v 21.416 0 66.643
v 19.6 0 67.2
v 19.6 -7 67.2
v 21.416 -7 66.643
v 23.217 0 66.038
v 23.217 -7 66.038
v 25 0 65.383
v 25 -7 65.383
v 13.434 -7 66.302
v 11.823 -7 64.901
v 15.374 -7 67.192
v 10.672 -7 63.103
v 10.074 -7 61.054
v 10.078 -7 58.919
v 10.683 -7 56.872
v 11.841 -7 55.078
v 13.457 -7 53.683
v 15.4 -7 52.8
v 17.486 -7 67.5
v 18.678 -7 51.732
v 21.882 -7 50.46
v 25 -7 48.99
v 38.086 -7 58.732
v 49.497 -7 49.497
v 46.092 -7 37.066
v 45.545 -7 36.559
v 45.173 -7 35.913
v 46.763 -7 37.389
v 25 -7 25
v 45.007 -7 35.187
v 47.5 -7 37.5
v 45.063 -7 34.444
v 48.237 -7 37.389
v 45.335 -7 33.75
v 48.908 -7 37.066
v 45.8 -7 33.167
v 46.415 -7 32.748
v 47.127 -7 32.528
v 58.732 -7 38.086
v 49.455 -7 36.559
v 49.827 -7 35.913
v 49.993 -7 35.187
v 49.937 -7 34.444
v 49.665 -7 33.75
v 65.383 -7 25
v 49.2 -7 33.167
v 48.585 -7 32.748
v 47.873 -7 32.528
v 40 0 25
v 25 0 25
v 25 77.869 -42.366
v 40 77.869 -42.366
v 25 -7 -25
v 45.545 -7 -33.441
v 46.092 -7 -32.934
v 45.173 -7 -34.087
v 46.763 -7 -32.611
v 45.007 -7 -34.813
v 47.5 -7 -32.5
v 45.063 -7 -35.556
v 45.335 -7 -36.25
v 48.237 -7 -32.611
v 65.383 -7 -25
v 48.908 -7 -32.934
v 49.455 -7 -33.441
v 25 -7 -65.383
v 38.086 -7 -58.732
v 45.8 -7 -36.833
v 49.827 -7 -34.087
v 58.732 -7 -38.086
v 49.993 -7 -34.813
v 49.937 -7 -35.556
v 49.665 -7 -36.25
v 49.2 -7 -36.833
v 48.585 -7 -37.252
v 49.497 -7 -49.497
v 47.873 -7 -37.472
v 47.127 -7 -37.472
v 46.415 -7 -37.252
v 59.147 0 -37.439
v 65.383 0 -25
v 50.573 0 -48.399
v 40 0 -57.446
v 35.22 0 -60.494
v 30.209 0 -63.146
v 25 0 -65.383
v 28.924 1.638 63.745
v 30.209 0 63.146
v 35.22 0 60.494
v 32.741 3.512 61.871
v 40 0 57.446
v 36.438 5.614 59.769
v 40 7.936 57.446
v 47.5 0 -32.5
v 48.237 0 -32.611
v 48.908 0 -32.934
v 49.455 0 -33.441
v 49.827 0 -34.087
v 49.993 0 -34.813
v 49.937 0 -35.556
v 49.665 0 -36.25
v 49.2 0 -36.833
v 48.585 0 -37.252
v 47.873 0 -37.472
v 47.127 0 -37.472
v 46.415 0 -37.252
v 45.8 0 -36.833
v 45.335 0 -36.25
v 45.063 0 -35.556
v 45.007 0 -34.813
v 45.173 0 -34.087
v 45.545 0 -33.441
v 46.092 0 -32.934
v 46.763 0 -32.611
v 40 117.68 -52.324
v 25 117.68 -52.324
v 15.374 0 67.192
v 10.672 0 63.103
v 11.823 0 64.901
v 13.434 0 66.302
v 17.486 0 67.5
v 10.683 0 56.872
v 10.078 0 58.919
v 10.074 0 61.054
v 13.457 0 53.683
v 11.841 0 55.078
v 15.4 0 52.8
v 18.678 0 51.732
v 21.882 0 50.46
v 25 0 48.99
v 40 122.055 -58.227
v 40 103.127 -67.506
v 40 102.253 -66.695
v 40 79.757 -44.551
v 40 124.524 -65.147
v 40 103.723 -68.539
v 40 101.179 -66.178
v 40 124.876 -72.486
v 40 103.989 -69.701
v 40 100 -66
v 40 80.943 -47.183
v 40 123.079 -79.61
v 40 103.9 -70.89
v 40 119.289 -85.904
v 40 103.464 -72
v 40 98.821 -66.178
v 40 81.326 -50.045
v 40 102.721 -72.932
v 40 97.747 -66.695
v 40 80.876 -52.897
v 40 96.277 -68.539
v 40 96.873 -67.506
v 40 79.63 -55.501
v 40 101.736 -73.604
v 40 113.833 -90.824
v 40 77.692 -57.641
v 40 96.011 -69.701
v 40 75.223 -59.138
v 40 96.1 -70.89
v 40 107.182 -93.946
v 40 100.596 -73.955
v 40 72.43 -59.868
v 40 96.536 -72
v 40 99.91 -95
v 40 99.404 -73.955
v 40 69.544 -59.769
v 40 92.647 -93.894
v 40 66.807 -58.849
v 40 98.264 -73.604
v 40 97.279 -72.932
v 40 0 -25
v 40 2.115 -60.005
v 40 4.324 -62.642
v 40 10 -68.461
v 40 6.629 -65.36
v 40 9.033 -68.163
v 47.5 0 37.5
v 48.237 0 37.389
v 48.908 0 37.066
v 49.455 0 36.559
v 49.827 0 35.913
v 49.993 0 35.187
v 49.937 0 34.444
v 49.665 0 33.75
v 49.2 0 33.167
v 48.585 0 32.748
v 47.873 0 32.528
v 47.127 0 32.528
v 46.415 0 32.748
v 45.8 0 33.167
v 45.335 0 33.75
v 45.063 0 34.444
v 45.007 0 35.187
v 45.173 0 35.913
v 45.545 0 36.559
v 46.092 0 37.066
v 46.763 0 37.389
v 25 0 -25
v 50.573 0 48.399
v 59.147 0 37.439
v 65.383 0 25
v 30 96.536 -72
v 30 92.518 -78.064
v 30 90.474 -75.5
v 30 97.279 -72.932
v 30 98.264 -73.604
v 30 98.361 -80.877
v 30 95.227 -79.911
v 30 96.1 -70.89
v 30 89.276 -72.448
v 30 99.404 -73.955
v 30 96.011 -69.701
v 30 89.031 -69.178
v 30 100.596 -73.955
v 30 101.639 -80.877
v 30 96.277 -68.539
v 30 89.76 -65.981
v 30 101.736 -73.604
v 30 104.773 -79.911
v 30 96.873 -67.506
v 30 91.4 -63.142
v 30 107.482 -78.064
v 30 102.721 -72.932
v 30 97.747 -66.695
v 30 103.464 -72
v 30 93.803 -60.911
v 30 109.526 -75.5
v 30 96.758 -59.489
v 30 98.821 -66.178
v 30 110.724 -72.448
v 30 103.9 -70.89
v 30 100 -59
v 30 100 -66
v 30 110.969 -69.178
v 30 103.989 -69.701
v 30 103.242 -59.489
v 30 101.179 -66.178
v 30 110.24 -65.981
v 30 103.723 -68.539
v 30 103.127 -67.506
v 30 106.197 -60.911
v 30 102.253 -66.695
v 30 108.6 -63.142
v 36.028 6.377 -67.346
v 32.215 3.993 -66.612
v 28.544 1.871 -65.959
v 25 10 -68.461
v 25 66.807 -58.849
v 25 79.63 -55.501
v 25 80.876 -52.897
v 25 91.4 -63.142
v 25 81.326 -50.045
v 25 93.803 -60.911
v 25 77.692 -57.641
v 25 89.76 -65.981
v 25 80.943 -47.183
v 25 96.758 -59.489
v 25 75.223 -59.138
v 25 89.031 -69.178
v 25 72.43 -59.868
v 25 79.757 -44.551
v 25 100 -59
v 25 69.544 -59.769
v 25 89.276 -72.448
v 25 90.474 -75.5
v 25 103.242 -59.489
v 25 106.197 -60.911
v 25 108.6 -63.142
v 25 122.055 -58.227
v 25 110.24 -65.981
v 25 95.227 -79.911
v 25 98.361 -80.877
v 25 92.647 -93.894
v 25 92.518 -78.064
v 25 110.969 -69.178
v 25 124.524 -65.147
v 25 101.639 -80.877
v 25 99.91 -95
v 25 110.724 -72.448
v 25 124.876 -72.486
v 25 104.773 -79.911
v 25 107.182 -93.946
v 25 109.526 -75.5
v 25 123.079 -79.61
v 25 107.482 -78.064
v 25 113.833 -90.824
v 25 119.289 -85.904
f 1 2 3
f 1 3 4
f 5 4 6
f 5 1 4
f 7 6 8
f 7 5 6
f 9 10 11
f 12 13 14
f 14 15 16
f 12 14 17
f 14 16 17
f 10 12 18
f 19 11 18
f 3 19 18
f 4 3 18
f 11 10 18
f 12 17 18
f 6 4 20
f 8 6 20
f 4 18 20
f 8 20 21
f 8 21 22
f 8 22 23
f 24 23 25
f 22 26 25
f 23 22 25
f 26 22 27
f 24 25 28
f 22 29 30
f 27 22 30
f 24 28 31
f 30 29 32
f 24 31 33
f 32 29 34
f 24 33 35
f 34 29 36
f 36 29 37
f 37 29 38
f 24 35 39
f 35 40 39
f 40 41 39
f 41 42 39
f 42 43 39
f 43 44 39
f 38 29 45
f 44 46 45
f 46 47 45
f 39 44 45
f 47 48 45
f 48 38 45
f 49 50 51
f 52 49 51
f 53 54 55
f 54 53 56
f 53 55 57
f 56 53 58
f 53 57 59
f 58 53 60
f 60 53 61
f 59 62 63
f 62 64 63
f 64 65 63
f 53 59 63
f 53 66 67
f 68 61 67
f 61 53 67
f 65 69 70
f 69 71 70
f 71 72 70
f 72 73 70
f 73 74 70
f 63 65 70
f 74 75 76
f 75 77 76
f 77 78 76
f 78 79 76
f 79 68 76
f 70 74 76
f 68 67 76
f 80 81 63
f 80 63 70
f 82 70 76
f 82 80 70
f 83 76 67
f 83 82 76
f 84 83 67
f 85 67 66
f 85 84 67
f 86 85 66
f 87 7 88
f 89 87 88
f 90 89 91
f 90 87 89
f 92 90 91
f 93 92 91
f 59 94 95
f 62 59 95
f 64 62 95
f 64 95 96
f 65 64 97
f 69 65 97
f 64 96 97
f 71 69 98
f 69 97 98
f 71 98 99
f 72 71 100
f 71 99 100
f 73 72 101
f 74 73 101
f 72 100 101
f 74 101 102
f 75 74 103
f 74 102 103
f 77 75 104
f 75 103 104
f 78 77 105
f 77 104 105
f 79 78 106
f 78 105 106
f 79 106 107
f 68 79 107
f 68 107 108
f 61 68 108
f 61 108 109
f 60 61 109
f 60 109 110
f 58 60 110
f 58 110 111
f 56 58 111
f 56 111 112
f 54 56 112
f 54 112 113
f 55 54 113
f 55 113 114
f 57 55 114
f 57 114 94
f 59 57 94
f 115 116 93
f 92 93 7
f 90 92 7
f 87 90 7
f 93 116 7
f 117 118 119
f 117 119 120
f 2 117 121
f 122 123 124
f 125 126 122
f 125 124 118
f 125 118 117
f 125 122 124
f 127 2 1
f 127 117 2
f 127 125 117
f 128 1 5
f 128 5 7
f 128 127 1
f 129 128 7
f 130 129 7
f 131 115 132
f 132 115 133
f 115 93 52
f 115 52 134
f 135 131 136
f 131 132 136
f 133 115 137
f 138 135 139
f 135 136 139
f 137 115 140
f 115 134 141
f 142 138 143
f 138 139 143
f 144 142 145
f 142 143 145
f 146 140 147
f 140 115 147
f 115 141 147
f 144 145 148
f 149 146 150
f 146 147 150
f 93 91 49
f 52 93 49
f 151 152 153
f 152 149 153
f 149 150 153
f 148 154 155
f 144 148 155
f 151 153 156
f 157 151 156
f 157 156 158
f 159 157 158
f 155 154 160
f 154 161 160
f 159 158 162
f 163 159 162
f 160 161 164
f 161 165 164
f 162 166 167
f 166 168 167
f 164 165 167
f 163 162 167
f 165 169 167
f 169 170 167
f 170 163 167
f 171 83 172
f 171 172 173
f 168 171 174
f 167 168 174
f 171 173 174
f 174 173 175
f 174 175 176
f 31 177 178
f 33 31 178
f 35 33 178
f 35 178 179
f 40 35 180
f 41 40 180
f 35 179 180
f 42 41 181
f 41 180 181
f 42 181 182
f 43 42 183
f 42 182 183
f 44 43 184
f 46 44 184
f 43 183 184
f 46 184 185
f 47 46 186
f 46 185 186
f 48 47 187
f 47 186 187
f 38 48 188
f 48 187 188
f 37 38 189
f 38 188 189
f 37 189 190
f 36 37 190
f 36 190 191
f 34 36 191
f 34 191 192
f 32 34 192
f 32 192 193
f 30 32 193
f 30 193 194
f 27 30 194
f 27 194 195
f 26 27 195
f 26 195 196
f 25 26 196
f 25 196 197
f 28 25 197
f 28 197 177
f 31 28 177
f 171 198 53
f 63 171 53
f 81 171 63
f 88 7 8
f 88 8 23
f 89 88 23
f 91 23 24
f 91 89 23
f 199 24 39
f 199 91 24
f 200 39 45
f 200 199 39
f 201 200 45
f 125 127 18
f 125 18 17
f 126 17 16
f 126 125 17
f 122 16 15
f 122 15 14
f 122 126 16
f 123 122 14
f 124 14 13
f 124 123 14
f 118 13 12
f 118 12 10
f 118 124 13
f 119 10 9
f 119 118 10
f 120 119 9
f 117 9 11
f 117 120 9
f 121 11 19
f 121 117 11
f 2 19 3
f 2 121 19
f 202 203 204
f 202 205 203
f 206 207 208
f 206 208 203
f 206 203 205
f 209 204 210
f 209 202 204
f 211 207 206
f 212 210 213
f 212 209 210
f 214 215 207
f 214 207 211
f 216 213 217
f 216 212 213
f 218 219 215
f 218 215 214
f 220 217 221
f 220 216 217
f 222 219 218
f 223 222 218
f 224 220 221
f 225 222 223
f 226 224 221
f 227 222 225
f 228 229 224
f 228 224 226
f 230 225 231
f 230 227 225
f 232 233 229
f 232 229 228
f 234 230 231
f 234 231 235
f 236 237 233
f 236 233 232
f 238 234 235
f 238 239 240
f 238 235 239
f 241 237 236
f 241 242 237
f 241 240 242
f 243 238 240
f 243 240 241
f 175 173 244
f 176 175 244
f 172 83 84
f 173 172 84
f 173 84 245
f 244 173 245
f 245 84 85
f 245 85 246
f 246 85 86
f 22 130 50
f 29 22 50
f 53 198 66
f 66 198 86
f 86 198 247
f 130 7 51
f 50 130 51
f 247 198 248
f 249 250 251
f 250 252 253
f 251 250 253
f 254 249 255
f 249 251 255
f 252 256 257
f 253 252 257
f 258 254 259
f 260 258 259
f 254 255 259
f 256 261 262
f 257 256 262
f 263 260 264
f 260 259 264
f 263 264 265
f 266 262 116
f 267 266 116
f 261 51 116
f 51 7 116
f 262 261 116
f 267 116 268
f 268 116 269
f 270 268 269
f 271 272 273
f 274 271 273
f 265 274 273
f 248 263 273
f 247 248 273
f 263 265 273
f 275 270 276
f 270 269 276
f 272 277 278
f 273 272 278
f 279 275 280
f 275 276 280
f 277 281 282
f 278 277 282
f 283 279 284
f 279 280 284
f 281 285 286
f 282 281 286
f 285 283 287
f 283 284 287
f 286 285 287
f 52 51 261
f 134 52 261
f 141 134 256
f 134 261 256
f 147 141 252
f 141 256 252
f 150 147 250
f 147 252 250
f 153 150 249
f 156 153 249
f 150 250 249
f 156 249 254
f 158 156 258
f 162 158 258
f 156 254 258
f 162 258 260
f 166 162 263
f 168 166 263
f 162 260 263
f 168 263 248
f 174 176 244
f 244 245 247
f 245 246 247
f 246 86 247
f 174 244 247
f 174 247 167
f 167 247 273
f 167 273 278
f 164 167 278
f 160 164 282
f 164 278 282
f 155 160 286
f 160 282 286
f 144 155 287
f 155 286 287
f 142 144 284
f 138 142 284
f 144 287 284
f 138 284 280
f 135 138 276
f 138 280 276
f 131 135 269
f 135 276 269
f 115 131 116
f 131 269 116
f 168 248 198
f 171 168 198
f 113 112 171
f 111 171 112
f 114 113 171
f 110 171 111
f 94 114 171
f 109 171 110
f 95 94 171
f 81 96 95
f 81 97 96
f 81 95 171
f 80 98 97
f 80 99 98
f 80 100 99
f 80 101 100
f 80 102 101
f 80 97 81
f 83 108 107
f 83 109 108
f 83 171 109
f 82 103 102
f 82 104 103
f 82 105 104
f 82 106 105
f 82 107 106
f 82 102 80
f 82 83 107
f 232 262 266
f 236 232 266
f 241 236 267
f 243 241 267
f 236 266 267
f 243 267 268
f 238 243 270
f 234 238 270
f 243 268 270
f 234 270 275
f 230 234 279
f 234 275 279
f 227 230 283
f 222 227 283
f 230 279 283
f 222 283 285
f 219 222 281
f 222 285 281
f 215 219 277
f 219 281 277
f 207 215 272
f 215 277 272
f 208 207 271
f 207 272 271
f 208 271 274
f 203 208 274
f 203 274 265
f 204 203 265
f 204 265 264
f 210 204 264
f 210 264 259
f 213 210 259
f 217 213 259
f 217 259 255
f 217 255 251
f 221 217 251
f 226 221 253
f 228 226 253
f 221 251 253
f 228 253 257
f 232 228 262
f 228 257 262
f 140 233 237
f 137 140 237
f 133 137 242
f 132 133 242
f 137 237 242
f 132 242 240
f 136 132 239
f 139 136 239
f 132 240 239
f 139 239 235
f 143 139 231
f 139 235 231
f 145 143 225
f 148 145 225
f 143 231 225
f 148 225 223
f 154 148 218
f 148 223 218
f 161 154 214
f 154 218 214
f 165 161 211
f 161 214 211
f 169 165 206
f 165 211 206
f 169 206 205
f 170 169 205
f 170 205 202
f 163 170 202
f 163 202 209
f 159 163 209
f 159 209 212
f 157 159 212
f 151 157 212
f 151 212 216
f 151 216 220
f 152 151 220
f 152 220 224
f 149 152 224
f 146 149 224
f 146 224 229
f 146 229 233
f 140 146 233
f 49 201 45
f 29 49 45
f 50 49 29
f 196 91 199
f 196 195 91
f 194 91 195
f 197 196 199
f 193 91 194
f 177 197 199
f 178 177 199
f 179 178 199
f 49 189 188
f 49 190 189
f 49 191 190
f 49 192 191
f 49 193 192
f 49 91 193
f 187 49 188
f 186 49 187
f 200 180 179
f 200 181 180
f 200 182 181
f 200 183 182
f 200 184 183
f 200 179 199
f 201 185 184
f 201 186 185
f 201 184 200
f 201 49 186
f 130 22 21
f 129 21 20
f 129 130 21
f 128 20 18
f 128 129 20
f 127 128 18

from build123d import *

# Parameters (mm, degrees)
BOSS_EXTRUDE1_DEPTH   = 7
BOSS_EXTRUDE1_2_DEPTH = 7
BOSS_EXTRUDE2_DEPTH   = 15
CUT_EXTRUDE2_START    = 10
SKETCH3_R             = 92.486171345
SKETCH3_R_2           = 70
CUT_EXTRUDE2_DEPTH    = 10
CHAMFER2_SIZE         = 10
SKETCH4_R             = 4
CUT_EXTRUDE3_DEPTH    = 163.113620009
SKETCH5_R             = 11
CUT_EXTRUDE4_DEPTH    = 5
SKETCH6_R             = 2.5
CUT_EXTRUDE5_DEPTH    = 171.073513517
BOSS_EXTRUDE3_DEPTH   = 7


with BuildPart() as part:
    # Sketch1 → Boss-Extrude1 (new body)
    with BuildSketch(Plane(origin=(0, 0, 0), x_dir=(1, 0, 0), z_dir=(0, 1, 0))):
        with BuildLine():
            ThreePointArc((65.383484153, 25), (49.497474683, 49.497474683), (25, 65.383484153))
            Line((25, 65.383484153), (25, 25))
            Line((25, 25), (65.383484153, 25))
        make_face()
    extrude(amount=-BOSS_EXTRUDE1_DEPTH)



with BuildPart() as body_2:
    # Sketch1 → Boss-Extrude1 2 (new body)
    with BuildSketch(Plane(origin=(0, 0, 0), x_dir=(1, 0, 0), z_dir=(0, 1, 0))):
        with BuildLine():
            Line((25, -25), (25, -65.383484153))
            ThreePointArc((25, -65.383484153), (49.497474683, -49.497474683), (65.383484153, -25))
            Line((65.383484153, -25), (25, -25))
        make_face()
    extrude(amount=-BOSS_EXTRUDE1_2_DEPTH)


with BuildPart() as part_1:
    add(part.part)

    add(body_2.part)  # Boss-Extrude2 merges body 2
    # Sketch2 → Boss-Extrude2 (add)
    with BuildSketch(Plane.ZY.offset(-25)):
        with BuildLine():
            Line((-65.383484153, 0), (-93.894188194, 92.646921016))
            ThreePointArc((-93.894188194, 92.646921016), (-82.896855971, 121.416608183), (-52.324444318, 117.679783125))
            Line((-52.324444318, 117.679783125), (65.383484153, 0))
            Line((65.383484153, 0), (25, 0))
            Line((25, 0), (-42.366125313, 77.869487777))
            ThreePointArc((-42.366125313, 77.869487777), (-55.501453858, 79.630239272), (-58.849166194, 66.807216074))
            Line((-58.849166194, 66.807216074), (-25, 0))
            Line((-25, 0), (-65.383484153, 0))
        make_face()
    extrude(amount=-BOSS_EXTRUDE2_DEPTH)

    # Sketch3 → Cut-Extrude2 (cut)
    with BuildSketch(Plane(origin=(0, 0, 0), x_dir=(1, 0, 0), z_dir=(0, 1, 0)).offset(CUT_EXTRUDE2_START)):
        Circle(SKETCH3_R)
        Circle(SKETCH3_R_2, mode=Mode.SUBTRACT)
    extrude(amount=-CUT_EXTRUDE2_DEPTH, mode=Mode.SUBTRACT)

    # Chamfer2
    # the kernel refuses this chamfer: 10 mm, written as the material it adds along each edge
    with BuildSketch(Plane(origin=(0, 10, 0), x_dir=(0.8280566024533268, 0, -0.5606445069145448), z_dir=(0.5606445069145448, 0, 0.8280566024533268))) as chamfer2_piece_1_section:
        Polygon((70 + CHAMFER2_SIZE, 0), (70, -CHAMFER2_SIZE), (70, 0), align=None)
    chamfer2_piece_1 = revolve(axis=Axis((0, 10, 0), (0, 1, 0)), revolution_arc=56.024500162, mode=Mode.PRIVATE)
    chamfer2_piece_1 = split(chamfer2_piece_1, bisect_by=Plane(origin=(33.827146268, 0, -63.755868056), z_dir=(0, 1, 0)), keep=Keep.TOP, mode=Mode.PRIVATE)
    chamfer2_piece_1 = split(chamfer2_piece_1, bisect_by=Plane(origin=(40, 6.324094296, -63.755868056), z_dir=(-1, 0, 0)), keep=Keep.TOP, mode=Mode.PRIVATE)
    chamfer2_piece_1 = split(chamfer2_piece_1, bisect_by=Plane(origin=(33.827146268, 5.319462172, -67.020469063), z_dir=(0, 0.2941231593783912, 0.9557675277583318)), keep=Keep.TOP, mode=Mode.PRIVATE)
    chamfer2_piece_1 = split(chamfer2_piece_1, bisect_by=Plane(origin=(25, 6.324094296, -63.755868056), z_dir=(1, 0, 0)), keep=Keep.TOP, mode=Mode.PRIVATE)
    add(chamfer2_piece_1)

    # Sketch4 → Cut-Extrude3 (cut, through all)
    with BuildSketch(Plane.ZY.offset(-25)):
        with Locations((-70, 100)):
            Circle(SKETCH4_R)
    extrude(amount=-CUT_EXTRUDE3_DEPTH, mode=Mode.SUBTRACT)

    # Sketch5 → Cut-Extrude4 (cut)
    with BuildSketch(Plane.ZY.offset(-25)):
        with Locations((-70, 100)):
            Circle(SKETCH5_R)
    extrude(amount=-CUT_EXTRUDE4_DEPTH, mode=Mode.SUBTRACT)

    # Sketch6 → Cut-Extrude5 (cut, through all)
    with BuildSketch(Plane(origin=(0, 0, 0), x_dir=(1, 0, 0), z_dir=(0, 1, 0))):
        with Locations(Location((47.5, 35, 0), (0, 0, 270))):
            Circle(SKETCH6_R)
        with Locations(Location((47.5, -35, 0), (0, 0, 270))):
            Circle(SKETCH6_R)
    extrude(amount=-CUT_EXTRUDE5_DEPTH, mode=Mode.SUBTRACT)

    # Sketch7 → Boss-Extrude3 (add)
    with BuildSketch(Plane(origin=(0, 0, 0), x_dir=(1, 0, 0), z_dir=(0, 1, 0))):
        with BuildLine():
            Line((25, -65.383484153), (25.1277486, -48.924393203))
            ThreePointArc((25.1277486, -48.924393203), (20.356318028, -51.094229775), (15.4, -52.8))
            ThreePointArc((15.4, -52.8), (10.3, -62.1), (19.6, -67.2))
            ThreePointArc((19.6, -67.2), (22.318488579, -66.346703517), (25, -65.383484153))
        make_face()
    extrude(amount=-BOSS_EXTRUDE3_DEPTH)


solid = part_1.part
